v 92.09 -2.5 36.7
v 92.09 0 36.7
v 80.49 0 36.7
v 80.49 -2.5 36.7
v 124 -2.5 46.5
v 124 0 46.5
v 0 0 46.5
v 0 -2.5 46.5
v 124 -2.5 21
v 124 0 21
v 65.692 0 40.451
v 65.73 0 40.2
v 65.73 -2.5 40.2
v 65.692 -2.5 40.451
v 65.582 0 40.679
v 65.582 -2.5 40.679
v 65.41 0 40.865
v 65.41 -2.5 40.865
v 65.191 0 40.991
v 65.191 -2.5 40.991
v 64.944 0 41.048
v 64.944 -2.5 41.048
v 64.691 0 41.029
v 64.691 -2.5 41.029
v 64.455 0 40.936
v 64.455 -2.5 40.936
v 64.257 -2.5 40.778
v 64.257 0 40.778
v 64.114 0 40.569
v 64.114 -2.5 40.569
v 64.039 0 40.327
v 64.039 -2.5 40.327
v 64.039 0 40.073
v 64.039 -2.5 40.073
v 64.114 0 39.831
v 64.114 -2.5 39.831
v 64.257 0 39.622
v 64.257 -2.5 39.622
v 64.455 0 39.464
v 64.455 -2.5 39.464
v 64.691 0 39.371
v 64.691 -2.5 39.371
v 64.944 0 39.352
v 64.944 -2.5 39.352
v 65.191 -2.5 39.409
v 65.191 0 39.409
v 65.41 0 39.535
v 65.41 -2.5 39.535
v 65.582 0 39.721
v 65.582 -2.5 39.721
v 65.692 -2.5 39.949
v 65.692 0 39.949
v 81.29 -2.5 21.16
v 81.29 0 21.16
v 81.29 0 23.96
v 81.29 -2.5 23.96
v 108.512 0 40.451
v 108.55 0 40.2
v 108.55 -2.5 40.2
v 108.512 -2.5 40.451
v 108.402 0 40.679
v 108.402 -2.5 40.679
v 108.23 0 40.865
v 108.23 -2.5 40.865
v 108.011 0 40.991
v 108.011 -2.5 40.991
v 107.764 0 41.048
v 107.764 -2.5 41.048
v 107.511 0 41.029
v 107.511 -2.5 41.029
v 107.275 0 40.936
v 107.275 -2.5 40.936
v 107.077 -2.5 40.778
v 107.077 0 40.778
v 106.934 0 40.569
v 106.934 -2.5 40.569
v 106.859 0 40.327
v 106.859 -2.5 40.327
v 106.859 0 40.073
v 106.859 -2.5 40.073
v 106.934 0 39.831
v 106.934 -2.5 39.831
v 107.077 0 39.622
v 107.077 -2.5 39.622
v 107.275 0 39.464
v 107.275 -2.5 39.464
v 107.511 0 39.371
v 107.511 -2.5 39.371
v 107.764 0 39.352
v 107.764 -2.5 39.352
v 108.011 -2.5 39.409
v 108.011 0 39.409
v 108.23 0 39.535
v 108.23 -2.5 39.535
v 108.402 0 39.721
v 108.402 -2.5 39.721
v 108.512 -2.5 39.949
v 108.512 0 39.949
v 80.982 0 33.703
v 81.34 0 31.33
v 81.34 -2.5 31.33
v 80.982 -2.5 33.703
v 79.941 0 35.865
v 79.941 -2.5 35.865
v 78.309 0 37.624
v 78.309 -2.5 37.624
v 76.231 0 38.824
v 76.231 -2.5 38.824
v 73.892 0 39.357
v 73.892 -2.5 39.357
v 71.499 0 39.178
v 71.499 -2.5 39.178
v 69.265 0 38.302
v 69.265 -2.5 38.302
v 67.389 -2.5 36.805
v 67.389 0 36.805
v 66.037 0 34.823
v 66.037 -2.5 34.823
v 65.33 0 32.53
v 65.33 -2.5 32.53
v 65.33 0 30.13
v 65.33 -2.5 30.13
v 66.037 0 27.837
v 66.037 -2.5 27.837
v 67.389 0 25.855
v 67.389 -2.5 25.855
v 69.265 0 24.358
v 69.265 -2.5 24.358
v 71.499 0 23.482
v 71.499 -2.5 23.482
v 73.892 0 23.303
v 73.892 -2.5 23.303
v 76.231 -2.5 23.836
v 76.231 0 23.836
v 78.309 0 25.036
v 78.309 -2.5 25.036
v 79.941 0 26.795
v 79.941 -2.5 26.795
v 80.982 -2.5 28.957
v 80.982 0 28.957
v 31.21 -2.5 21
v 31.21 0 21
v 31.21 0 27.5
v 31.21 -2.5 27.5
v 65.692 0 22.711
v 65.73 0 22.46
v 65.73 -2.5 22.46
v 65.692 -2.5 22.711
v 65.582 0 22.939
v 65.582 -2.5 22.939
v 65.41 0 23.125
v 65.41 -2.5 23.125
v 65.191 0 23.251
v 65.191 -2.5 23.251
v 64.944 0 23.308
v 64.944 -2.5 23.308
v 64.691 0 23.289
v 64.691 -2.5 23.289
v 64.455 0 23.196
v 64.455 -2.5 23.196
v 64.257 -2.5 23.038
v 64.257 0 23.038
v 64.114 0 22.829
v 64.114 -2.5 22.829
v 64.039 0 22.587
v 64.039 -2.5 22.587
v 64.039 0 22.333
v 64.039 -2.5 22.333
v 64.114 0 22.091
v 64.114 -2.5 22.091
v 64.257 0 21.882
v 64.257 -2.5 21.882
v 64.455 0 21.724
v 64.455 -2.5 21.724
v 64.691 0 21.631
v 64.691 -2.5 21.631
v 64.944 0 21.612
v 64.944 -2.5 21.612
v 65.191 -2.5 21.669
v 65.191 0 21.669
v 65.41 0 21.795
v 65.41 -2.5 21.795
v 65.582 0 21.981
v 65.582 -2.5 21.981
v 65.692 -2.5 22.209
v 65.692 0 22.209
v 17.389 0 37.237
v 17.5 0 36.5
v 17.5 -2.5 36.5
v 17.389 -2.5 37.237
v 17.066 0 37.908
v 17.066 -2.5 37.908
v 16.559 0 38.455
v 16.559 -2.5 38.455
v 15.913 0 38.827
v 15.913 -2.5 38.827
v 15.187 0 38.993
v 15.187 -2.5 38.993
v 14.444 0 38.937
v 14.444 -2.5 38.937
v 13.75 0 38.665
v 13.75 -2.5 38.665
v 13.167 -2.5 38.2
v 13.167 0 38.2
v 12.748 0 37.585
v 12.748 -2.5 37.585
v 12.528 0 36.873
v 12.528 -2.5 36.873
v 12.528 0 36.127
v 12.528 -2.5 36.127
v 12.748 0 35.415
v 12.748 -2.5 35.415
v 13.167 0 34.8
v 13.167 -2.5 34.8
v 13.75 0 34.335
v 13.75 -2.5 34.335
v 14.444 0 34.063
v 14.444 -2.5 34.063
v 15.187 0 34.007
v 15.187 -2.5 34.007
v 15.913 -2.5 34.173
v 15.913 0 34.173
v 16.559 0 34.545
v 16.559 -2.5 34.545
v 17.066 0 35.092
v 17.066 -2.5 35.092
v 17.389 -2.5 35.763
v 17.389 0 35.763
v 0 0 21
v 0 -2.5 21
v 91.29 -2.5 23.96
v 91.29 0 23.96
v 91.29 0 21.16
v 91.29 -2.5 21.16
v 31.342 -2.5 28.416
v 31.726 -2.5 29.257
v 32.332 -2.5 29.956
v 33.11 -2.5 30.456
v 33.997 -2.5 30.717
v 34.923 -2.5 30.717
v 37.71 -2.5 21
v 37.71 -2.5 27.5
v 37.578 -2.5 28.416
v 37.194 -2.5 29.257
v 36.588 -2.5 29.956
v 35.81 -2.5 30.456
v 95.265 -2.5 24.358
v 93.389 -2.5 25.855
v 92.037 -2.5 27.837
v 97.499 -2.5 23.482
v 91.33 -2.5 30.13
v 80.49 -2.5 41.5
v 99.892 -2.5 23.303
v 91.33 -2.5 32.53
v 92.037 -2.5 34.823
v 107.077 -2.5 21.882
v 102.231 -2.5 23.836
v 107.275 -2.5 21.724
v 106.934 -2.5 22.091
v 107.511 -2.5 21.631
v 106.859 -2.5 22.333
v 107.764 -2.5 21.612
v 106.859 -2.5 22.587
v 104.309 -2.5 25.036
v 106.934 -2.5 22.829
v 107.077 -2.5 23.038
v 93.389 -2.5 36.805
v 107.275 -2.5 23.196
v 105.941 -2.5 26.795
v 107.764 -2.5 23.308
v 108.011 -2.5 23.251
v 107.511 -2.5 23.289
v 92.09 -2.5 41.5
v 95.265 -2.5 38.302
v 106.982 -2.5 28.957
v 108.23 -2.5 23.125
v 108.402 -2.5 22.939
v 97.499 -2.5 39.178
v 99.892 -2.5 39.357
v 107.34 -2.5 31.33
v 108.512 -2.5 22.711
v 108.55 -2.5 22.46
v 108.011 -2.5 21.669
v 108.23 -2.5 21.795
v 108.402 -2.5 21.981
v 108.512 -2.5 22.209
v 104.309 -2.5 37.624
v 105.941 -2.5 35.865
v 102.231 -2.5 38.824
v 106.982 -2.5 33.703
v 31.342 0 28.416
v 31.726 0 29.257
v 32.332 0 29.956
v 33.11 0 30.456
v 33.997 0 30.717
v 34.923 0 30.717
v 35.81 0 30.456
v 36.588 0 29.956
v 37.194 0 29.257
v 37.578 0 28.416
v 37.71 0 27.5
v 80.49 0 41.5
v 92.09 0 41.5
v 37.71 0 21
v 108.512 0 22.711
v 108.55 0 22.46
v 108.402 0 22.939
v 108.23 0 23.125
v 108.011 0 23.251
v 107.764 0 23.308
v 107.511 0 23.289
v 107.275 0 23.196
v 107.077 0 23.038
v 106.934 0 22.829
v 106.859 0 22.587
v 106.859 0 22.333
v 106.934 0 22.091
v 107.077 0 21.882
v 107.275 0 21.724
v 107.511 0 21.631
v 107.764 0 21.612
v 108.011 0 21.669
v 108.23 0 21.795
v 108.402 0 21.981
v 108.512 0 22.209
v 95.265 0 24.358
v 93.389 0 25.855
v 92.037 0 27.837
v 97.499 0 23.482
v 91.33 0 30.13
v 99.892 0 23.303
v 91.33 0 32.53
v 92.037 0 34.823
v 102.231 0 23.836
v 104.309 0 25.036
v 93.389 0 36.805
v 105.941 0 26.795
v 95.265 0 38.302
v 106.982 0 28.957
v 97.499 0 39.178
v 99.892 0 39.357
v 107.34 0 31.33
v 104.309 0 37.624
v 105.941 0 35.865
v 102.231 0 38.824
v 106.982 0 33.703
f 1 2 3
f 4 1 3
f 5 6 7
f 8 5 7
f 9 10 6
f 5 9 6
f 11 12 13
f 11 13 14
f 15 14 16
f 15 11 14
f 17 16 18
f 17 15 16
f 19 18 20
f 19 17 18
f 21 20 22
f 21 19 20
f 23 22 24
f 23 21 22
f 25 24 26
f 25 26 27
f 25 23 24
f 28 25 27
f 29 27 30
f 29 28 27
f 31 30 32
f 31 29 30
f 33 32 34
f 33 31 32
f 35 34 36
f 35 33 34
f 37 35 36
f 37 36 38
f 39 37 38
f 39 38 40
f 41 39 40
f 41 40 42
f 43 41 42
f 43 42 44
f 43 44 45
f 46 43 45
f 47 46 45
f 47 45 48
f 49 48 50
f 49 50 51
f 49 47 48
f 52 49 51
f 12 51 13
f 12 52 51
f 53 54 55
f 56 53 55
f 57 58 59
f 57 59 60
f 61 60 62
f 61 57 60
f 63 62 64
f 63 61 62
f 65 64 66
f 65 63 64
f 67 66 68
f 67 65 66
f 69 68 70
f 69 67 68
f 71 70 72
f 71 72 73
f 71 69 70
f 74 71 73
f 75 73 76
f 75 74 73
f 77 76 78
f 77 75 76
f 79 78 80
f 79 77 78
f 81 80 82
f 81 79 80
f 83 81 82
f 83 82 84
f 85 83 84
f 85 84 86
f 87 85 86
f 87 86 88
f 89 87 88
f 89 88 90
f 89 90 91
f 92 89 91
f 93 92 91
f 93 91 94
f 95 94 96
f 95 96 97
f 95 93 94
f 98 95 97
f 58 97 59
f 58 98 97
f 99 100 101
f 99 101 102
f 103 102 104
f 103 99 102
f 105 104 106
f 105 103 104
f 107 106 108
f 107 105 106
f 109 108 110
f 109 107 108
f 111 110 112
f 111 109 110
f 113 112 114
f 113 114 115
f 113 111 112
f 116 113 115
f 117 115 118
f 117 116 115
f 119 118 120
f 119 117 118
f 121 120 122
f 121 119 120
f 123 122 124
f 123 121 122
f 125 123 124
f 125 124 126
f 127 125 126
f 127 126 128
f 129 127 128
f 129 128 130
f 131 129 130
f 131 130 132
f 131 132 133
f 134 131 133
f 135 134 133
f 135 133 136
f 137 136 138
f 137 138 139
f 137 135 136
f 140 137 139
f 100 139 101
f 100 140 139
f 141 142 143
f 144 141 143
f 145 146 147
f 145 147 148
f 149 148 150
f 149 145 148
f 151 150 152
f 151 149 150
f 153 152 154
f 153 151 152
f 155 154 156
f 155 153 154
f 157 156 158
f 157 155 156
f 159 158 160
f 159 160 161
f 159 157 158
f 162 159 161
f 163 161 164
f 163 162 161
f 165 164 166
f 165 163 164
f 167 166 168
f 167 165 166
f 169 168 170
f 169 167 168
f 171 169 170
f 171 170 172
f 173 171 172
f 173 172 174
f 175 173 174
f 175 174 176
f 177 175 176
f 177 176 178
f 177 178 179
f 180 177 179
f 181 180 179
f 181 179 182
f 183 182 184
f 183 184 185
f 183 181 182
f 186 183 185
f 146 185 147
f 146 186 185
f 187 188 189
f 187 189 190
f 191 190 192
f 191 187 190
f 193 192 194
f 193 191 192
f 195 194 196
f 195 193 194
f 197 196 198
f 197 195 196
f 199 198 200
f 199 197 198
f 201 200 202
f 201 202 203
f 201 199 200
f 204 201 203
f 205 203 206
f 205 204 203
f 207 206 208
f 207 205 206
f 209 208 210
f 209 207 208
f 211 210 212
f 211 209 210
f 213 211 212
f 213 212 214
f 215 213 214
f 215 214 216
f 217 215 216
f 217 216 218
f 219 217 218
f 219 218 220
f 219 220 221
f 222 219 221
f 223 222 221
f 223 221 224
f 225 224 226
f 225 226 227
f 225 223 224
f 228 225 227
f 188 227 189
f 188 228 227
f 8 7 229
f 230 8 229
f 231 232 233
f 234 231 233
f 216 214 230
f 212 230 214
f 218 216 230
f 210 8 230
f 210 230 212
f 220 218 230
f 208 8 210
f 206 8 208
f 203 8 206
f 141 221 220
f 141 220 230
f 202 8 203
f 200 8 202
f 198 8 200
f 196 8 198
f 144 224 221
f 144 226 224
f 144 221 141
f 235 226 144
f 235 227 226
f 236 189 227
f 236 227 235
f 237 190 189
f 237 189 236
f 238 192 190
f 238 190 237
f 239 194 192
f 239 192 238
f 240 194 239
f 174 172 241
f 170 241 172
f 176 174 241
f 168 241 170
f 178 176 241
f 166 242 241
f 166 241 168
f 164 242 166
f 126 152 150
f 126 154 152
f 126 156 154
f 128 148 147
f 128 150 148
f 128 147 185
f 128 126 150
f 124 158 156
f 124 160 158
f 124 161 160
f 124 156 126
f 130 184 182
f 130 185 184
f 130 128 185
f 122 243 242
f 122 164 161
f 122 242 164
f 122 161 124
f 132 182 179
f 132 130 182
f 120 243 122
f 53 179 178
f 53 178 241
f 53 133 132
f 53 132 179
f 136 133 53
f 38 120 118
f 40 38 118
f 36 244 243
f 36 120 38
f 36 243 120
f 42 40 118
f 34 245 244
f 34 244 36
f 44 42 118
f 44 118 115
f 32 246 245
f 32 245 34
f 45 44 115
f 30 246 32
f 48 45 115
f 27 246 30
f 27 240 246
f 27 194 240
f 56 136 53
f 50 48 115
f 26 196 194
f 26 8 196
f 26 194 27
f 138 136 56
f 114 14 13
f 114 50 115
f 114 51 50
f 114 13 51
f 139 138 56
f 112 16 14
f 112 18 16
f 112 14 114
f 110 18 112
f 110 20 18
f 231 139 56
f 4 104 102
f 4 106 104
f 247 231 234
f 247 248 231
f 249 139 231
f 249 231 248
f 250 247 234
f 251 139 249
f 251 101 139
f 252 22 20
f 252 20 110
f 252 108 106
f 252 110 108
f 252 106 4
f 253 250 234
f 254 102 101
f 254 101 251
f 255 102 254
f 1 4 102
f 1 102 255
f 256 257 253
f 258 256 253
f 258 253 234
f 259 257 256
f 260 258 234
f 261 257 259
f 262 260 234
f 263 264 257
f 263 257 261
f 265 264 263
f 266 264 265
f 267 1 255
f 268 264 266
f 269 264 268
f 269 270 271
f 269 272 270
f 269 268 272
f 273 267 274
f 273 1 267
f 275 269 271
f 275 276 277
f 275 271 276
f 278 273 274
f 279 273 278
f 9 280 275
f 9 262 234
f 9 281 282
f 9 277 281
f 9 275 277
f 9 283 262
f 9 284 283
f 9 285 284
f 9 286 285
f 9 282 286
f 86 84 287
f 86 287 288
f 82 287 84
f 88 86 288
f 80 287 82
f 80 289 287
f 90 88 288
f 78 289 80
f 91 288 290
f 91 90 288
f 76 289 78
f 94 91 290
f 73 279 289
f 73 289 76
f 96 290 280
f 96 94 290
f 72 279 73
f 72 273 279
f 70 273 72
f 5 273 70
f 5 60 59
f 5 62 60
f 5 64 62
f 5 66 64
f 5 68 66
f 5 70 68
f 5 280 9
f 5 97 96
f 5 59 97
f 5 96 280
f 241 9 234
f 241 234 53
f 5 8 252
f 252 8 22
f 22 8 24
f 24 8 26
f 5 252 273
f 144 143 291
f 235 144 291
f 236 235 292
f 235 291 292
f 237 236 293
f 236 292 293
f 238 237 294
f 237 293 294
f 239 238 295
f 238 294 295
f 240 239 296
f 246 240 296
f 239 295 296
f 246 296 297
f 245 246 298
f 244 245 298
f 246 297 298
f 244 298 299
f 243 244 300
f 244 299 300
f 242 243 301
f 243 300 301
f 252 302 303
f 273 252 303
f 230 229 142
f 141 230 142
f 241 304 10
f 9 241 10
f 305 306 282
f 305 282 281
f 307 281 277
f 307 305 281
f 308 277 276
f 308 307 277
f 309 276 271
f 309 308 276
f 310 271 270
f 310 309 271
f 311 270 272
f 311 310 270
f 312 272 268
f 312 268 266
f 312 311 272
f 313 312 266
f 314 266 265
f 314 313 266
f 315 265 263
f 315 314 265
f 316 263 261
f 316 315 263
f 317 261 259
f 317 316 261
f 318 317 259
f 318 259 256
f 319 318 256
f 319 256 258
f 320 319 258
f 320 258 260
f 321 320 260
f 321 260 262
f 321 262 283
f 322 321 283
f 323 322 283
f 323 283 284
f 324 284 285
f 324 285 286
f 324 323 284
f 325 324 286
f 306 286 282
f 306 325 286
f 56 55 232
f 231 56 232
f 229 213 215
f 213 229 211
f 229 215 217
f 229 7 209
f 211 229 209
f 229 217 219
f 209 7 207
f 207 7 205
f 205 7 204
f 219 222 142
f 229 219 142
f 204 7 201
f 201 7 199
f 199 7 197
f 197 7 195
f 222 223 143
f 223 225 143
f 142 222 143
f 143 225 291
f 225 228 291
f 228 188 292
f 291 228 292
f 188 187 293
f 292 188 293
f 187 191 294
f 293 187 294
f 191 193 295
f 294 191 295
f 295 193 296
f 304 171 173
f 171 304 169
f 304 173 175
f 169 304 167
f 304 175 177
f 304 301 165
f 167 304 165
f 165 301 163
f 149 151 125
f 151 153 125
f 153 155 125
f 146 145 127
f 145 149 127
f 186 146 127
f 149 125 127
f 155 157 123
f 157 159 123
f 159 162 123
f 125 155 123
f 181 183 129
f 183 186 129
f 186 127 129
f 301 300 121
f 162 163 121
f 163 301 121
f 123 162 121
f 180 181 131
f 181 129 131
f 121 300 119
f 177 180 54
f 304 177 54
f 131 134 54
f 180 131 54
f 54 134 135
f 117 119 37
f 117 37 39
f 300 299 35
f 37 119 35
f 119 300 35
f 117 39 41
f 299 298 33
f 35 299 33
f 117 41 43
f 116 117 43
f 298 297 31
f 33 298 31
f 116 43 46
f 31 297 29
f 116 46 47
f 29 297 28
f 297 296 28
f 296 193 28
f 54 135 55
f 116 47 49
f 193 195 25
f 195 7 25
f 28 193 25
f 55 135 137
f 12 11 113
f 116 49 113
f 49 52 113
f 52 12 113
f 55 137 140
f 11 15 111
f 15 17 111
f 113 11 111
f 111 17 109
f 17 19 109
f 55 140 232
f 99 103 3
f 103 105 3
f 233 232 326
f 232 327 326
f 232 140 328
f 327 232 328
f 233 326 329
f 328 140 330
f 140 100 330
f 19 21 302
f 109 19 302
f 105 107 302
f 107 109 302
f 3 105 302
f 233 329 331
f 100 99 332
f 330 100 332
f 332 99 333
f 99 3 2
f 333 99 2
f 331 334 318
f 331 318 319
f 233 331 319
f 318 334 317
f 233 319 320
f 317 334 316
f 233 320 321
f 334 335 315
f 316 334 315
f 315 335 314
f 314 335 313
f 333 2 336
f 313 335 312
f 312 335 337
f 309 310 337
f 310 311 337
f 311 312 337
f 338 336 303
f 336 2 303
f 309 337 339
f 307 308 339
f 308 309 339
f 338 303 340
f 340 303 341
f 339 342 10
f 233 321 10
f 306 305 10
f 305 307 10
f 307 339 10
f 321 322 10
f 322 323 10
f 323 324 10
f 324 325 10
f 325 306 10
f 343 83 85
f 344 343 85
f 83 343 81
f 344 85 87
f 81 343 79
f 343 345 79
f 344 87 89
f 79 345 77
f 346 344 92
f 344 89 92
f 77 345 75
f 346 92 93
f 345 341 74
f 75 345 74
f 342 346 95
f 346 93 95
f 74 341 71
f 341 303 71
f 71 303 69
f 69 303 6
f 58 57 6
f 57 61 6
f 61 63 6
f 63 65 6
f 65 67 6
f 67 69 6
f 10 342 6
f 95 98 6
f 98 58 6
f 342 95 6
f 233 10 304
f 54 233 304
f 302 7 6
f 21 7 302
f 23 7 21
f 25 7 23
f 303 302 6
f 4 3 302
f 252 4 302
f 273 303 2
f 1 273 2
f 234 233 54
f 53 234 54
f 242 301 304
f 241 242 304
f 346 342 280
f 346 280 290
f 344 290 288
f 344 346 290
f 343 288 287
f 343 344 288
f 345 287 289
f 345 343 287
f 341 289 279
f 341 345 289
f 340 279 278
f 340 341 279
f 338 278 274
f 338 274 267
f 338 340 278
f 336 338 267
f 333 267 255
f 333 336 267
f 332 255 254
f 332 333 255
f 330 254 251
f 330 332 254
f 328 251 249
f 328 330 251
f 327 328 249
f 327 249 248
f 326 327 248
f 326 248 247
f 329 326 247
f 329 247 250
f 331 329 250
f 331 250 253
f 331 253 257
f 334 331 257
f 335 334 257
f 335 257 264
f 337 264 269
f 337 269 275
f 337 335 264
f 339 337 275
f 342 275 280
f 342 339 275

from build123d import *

# Parameters (mm, degrees)
F0_R     = 0.85
F0_R_2   = 8.05
F0_R_3   = 2.5
F1_DEPTH = 2.5


with BuildPart() as f1:
    # F0 (on Front) → F1 (new body)
    with BuildSketch(Plane.XZ):
        with BuildLine():
            Line((0, 46.5), (0, 21))
            Line((0, 21), (31.21, 21))
            Line((31.21, 21), (31.21, 27.5))
            ThreePointArc((31.21, 27.5), (34.46, 30.75), (37.71, 27.5))
            Line((37.71, 27.5), (37.71, 21))
            Line((37.71, 21), (124, 21))
            Line((124, 21), (124, 46.5))
            Line((124, 46.5), (0, 46.5))
        make_face()
        with Locations((64.88, 22.46)):
            Circle(F0_R, mode=Mode.SUBTRACT)
        Polygon((81.29, 21.16), (81.29, 23.96), (86.29, 23.96), (91.29, 23.96), (91.29, 21.16), (86.29, 21.16), align=None, mode=Mode.SUBTRACT)
        with Locations((107.7, 22.46)):
            Circle(F0_R, mode=Mode.SUBTRACT)
        with Locations((73.29, 31.33)):
            Circle(F0_R_2, mode=Mode.SUBTRACT)
        with Locations((99.29, 31.33)):
            Circle(F0_R_2, mode=Mode.SUBTRACT)
        with Locations((15, 36.5)):
            Circle(F0_R_3, mode=Mode.SUBTRACT)
        Polygon((80.49, 36.7), (80.49, 41.5), (86.29, 41.5), (92.09, 41.5), (92.09, 36.7), (86.29, 36.7), align=None, mode=Mode.SUBTRACT)
        with Locations((64.88, 40.2)):
            Circle(F0_R, mode=Mode.SUBTRACT)
        with Locations((107.7, 40.2)):
            Circle(F0_R, mode=Mode.SUBTRACT)
    extrude(amount=F1_DEPTH)


solid = f1.part
